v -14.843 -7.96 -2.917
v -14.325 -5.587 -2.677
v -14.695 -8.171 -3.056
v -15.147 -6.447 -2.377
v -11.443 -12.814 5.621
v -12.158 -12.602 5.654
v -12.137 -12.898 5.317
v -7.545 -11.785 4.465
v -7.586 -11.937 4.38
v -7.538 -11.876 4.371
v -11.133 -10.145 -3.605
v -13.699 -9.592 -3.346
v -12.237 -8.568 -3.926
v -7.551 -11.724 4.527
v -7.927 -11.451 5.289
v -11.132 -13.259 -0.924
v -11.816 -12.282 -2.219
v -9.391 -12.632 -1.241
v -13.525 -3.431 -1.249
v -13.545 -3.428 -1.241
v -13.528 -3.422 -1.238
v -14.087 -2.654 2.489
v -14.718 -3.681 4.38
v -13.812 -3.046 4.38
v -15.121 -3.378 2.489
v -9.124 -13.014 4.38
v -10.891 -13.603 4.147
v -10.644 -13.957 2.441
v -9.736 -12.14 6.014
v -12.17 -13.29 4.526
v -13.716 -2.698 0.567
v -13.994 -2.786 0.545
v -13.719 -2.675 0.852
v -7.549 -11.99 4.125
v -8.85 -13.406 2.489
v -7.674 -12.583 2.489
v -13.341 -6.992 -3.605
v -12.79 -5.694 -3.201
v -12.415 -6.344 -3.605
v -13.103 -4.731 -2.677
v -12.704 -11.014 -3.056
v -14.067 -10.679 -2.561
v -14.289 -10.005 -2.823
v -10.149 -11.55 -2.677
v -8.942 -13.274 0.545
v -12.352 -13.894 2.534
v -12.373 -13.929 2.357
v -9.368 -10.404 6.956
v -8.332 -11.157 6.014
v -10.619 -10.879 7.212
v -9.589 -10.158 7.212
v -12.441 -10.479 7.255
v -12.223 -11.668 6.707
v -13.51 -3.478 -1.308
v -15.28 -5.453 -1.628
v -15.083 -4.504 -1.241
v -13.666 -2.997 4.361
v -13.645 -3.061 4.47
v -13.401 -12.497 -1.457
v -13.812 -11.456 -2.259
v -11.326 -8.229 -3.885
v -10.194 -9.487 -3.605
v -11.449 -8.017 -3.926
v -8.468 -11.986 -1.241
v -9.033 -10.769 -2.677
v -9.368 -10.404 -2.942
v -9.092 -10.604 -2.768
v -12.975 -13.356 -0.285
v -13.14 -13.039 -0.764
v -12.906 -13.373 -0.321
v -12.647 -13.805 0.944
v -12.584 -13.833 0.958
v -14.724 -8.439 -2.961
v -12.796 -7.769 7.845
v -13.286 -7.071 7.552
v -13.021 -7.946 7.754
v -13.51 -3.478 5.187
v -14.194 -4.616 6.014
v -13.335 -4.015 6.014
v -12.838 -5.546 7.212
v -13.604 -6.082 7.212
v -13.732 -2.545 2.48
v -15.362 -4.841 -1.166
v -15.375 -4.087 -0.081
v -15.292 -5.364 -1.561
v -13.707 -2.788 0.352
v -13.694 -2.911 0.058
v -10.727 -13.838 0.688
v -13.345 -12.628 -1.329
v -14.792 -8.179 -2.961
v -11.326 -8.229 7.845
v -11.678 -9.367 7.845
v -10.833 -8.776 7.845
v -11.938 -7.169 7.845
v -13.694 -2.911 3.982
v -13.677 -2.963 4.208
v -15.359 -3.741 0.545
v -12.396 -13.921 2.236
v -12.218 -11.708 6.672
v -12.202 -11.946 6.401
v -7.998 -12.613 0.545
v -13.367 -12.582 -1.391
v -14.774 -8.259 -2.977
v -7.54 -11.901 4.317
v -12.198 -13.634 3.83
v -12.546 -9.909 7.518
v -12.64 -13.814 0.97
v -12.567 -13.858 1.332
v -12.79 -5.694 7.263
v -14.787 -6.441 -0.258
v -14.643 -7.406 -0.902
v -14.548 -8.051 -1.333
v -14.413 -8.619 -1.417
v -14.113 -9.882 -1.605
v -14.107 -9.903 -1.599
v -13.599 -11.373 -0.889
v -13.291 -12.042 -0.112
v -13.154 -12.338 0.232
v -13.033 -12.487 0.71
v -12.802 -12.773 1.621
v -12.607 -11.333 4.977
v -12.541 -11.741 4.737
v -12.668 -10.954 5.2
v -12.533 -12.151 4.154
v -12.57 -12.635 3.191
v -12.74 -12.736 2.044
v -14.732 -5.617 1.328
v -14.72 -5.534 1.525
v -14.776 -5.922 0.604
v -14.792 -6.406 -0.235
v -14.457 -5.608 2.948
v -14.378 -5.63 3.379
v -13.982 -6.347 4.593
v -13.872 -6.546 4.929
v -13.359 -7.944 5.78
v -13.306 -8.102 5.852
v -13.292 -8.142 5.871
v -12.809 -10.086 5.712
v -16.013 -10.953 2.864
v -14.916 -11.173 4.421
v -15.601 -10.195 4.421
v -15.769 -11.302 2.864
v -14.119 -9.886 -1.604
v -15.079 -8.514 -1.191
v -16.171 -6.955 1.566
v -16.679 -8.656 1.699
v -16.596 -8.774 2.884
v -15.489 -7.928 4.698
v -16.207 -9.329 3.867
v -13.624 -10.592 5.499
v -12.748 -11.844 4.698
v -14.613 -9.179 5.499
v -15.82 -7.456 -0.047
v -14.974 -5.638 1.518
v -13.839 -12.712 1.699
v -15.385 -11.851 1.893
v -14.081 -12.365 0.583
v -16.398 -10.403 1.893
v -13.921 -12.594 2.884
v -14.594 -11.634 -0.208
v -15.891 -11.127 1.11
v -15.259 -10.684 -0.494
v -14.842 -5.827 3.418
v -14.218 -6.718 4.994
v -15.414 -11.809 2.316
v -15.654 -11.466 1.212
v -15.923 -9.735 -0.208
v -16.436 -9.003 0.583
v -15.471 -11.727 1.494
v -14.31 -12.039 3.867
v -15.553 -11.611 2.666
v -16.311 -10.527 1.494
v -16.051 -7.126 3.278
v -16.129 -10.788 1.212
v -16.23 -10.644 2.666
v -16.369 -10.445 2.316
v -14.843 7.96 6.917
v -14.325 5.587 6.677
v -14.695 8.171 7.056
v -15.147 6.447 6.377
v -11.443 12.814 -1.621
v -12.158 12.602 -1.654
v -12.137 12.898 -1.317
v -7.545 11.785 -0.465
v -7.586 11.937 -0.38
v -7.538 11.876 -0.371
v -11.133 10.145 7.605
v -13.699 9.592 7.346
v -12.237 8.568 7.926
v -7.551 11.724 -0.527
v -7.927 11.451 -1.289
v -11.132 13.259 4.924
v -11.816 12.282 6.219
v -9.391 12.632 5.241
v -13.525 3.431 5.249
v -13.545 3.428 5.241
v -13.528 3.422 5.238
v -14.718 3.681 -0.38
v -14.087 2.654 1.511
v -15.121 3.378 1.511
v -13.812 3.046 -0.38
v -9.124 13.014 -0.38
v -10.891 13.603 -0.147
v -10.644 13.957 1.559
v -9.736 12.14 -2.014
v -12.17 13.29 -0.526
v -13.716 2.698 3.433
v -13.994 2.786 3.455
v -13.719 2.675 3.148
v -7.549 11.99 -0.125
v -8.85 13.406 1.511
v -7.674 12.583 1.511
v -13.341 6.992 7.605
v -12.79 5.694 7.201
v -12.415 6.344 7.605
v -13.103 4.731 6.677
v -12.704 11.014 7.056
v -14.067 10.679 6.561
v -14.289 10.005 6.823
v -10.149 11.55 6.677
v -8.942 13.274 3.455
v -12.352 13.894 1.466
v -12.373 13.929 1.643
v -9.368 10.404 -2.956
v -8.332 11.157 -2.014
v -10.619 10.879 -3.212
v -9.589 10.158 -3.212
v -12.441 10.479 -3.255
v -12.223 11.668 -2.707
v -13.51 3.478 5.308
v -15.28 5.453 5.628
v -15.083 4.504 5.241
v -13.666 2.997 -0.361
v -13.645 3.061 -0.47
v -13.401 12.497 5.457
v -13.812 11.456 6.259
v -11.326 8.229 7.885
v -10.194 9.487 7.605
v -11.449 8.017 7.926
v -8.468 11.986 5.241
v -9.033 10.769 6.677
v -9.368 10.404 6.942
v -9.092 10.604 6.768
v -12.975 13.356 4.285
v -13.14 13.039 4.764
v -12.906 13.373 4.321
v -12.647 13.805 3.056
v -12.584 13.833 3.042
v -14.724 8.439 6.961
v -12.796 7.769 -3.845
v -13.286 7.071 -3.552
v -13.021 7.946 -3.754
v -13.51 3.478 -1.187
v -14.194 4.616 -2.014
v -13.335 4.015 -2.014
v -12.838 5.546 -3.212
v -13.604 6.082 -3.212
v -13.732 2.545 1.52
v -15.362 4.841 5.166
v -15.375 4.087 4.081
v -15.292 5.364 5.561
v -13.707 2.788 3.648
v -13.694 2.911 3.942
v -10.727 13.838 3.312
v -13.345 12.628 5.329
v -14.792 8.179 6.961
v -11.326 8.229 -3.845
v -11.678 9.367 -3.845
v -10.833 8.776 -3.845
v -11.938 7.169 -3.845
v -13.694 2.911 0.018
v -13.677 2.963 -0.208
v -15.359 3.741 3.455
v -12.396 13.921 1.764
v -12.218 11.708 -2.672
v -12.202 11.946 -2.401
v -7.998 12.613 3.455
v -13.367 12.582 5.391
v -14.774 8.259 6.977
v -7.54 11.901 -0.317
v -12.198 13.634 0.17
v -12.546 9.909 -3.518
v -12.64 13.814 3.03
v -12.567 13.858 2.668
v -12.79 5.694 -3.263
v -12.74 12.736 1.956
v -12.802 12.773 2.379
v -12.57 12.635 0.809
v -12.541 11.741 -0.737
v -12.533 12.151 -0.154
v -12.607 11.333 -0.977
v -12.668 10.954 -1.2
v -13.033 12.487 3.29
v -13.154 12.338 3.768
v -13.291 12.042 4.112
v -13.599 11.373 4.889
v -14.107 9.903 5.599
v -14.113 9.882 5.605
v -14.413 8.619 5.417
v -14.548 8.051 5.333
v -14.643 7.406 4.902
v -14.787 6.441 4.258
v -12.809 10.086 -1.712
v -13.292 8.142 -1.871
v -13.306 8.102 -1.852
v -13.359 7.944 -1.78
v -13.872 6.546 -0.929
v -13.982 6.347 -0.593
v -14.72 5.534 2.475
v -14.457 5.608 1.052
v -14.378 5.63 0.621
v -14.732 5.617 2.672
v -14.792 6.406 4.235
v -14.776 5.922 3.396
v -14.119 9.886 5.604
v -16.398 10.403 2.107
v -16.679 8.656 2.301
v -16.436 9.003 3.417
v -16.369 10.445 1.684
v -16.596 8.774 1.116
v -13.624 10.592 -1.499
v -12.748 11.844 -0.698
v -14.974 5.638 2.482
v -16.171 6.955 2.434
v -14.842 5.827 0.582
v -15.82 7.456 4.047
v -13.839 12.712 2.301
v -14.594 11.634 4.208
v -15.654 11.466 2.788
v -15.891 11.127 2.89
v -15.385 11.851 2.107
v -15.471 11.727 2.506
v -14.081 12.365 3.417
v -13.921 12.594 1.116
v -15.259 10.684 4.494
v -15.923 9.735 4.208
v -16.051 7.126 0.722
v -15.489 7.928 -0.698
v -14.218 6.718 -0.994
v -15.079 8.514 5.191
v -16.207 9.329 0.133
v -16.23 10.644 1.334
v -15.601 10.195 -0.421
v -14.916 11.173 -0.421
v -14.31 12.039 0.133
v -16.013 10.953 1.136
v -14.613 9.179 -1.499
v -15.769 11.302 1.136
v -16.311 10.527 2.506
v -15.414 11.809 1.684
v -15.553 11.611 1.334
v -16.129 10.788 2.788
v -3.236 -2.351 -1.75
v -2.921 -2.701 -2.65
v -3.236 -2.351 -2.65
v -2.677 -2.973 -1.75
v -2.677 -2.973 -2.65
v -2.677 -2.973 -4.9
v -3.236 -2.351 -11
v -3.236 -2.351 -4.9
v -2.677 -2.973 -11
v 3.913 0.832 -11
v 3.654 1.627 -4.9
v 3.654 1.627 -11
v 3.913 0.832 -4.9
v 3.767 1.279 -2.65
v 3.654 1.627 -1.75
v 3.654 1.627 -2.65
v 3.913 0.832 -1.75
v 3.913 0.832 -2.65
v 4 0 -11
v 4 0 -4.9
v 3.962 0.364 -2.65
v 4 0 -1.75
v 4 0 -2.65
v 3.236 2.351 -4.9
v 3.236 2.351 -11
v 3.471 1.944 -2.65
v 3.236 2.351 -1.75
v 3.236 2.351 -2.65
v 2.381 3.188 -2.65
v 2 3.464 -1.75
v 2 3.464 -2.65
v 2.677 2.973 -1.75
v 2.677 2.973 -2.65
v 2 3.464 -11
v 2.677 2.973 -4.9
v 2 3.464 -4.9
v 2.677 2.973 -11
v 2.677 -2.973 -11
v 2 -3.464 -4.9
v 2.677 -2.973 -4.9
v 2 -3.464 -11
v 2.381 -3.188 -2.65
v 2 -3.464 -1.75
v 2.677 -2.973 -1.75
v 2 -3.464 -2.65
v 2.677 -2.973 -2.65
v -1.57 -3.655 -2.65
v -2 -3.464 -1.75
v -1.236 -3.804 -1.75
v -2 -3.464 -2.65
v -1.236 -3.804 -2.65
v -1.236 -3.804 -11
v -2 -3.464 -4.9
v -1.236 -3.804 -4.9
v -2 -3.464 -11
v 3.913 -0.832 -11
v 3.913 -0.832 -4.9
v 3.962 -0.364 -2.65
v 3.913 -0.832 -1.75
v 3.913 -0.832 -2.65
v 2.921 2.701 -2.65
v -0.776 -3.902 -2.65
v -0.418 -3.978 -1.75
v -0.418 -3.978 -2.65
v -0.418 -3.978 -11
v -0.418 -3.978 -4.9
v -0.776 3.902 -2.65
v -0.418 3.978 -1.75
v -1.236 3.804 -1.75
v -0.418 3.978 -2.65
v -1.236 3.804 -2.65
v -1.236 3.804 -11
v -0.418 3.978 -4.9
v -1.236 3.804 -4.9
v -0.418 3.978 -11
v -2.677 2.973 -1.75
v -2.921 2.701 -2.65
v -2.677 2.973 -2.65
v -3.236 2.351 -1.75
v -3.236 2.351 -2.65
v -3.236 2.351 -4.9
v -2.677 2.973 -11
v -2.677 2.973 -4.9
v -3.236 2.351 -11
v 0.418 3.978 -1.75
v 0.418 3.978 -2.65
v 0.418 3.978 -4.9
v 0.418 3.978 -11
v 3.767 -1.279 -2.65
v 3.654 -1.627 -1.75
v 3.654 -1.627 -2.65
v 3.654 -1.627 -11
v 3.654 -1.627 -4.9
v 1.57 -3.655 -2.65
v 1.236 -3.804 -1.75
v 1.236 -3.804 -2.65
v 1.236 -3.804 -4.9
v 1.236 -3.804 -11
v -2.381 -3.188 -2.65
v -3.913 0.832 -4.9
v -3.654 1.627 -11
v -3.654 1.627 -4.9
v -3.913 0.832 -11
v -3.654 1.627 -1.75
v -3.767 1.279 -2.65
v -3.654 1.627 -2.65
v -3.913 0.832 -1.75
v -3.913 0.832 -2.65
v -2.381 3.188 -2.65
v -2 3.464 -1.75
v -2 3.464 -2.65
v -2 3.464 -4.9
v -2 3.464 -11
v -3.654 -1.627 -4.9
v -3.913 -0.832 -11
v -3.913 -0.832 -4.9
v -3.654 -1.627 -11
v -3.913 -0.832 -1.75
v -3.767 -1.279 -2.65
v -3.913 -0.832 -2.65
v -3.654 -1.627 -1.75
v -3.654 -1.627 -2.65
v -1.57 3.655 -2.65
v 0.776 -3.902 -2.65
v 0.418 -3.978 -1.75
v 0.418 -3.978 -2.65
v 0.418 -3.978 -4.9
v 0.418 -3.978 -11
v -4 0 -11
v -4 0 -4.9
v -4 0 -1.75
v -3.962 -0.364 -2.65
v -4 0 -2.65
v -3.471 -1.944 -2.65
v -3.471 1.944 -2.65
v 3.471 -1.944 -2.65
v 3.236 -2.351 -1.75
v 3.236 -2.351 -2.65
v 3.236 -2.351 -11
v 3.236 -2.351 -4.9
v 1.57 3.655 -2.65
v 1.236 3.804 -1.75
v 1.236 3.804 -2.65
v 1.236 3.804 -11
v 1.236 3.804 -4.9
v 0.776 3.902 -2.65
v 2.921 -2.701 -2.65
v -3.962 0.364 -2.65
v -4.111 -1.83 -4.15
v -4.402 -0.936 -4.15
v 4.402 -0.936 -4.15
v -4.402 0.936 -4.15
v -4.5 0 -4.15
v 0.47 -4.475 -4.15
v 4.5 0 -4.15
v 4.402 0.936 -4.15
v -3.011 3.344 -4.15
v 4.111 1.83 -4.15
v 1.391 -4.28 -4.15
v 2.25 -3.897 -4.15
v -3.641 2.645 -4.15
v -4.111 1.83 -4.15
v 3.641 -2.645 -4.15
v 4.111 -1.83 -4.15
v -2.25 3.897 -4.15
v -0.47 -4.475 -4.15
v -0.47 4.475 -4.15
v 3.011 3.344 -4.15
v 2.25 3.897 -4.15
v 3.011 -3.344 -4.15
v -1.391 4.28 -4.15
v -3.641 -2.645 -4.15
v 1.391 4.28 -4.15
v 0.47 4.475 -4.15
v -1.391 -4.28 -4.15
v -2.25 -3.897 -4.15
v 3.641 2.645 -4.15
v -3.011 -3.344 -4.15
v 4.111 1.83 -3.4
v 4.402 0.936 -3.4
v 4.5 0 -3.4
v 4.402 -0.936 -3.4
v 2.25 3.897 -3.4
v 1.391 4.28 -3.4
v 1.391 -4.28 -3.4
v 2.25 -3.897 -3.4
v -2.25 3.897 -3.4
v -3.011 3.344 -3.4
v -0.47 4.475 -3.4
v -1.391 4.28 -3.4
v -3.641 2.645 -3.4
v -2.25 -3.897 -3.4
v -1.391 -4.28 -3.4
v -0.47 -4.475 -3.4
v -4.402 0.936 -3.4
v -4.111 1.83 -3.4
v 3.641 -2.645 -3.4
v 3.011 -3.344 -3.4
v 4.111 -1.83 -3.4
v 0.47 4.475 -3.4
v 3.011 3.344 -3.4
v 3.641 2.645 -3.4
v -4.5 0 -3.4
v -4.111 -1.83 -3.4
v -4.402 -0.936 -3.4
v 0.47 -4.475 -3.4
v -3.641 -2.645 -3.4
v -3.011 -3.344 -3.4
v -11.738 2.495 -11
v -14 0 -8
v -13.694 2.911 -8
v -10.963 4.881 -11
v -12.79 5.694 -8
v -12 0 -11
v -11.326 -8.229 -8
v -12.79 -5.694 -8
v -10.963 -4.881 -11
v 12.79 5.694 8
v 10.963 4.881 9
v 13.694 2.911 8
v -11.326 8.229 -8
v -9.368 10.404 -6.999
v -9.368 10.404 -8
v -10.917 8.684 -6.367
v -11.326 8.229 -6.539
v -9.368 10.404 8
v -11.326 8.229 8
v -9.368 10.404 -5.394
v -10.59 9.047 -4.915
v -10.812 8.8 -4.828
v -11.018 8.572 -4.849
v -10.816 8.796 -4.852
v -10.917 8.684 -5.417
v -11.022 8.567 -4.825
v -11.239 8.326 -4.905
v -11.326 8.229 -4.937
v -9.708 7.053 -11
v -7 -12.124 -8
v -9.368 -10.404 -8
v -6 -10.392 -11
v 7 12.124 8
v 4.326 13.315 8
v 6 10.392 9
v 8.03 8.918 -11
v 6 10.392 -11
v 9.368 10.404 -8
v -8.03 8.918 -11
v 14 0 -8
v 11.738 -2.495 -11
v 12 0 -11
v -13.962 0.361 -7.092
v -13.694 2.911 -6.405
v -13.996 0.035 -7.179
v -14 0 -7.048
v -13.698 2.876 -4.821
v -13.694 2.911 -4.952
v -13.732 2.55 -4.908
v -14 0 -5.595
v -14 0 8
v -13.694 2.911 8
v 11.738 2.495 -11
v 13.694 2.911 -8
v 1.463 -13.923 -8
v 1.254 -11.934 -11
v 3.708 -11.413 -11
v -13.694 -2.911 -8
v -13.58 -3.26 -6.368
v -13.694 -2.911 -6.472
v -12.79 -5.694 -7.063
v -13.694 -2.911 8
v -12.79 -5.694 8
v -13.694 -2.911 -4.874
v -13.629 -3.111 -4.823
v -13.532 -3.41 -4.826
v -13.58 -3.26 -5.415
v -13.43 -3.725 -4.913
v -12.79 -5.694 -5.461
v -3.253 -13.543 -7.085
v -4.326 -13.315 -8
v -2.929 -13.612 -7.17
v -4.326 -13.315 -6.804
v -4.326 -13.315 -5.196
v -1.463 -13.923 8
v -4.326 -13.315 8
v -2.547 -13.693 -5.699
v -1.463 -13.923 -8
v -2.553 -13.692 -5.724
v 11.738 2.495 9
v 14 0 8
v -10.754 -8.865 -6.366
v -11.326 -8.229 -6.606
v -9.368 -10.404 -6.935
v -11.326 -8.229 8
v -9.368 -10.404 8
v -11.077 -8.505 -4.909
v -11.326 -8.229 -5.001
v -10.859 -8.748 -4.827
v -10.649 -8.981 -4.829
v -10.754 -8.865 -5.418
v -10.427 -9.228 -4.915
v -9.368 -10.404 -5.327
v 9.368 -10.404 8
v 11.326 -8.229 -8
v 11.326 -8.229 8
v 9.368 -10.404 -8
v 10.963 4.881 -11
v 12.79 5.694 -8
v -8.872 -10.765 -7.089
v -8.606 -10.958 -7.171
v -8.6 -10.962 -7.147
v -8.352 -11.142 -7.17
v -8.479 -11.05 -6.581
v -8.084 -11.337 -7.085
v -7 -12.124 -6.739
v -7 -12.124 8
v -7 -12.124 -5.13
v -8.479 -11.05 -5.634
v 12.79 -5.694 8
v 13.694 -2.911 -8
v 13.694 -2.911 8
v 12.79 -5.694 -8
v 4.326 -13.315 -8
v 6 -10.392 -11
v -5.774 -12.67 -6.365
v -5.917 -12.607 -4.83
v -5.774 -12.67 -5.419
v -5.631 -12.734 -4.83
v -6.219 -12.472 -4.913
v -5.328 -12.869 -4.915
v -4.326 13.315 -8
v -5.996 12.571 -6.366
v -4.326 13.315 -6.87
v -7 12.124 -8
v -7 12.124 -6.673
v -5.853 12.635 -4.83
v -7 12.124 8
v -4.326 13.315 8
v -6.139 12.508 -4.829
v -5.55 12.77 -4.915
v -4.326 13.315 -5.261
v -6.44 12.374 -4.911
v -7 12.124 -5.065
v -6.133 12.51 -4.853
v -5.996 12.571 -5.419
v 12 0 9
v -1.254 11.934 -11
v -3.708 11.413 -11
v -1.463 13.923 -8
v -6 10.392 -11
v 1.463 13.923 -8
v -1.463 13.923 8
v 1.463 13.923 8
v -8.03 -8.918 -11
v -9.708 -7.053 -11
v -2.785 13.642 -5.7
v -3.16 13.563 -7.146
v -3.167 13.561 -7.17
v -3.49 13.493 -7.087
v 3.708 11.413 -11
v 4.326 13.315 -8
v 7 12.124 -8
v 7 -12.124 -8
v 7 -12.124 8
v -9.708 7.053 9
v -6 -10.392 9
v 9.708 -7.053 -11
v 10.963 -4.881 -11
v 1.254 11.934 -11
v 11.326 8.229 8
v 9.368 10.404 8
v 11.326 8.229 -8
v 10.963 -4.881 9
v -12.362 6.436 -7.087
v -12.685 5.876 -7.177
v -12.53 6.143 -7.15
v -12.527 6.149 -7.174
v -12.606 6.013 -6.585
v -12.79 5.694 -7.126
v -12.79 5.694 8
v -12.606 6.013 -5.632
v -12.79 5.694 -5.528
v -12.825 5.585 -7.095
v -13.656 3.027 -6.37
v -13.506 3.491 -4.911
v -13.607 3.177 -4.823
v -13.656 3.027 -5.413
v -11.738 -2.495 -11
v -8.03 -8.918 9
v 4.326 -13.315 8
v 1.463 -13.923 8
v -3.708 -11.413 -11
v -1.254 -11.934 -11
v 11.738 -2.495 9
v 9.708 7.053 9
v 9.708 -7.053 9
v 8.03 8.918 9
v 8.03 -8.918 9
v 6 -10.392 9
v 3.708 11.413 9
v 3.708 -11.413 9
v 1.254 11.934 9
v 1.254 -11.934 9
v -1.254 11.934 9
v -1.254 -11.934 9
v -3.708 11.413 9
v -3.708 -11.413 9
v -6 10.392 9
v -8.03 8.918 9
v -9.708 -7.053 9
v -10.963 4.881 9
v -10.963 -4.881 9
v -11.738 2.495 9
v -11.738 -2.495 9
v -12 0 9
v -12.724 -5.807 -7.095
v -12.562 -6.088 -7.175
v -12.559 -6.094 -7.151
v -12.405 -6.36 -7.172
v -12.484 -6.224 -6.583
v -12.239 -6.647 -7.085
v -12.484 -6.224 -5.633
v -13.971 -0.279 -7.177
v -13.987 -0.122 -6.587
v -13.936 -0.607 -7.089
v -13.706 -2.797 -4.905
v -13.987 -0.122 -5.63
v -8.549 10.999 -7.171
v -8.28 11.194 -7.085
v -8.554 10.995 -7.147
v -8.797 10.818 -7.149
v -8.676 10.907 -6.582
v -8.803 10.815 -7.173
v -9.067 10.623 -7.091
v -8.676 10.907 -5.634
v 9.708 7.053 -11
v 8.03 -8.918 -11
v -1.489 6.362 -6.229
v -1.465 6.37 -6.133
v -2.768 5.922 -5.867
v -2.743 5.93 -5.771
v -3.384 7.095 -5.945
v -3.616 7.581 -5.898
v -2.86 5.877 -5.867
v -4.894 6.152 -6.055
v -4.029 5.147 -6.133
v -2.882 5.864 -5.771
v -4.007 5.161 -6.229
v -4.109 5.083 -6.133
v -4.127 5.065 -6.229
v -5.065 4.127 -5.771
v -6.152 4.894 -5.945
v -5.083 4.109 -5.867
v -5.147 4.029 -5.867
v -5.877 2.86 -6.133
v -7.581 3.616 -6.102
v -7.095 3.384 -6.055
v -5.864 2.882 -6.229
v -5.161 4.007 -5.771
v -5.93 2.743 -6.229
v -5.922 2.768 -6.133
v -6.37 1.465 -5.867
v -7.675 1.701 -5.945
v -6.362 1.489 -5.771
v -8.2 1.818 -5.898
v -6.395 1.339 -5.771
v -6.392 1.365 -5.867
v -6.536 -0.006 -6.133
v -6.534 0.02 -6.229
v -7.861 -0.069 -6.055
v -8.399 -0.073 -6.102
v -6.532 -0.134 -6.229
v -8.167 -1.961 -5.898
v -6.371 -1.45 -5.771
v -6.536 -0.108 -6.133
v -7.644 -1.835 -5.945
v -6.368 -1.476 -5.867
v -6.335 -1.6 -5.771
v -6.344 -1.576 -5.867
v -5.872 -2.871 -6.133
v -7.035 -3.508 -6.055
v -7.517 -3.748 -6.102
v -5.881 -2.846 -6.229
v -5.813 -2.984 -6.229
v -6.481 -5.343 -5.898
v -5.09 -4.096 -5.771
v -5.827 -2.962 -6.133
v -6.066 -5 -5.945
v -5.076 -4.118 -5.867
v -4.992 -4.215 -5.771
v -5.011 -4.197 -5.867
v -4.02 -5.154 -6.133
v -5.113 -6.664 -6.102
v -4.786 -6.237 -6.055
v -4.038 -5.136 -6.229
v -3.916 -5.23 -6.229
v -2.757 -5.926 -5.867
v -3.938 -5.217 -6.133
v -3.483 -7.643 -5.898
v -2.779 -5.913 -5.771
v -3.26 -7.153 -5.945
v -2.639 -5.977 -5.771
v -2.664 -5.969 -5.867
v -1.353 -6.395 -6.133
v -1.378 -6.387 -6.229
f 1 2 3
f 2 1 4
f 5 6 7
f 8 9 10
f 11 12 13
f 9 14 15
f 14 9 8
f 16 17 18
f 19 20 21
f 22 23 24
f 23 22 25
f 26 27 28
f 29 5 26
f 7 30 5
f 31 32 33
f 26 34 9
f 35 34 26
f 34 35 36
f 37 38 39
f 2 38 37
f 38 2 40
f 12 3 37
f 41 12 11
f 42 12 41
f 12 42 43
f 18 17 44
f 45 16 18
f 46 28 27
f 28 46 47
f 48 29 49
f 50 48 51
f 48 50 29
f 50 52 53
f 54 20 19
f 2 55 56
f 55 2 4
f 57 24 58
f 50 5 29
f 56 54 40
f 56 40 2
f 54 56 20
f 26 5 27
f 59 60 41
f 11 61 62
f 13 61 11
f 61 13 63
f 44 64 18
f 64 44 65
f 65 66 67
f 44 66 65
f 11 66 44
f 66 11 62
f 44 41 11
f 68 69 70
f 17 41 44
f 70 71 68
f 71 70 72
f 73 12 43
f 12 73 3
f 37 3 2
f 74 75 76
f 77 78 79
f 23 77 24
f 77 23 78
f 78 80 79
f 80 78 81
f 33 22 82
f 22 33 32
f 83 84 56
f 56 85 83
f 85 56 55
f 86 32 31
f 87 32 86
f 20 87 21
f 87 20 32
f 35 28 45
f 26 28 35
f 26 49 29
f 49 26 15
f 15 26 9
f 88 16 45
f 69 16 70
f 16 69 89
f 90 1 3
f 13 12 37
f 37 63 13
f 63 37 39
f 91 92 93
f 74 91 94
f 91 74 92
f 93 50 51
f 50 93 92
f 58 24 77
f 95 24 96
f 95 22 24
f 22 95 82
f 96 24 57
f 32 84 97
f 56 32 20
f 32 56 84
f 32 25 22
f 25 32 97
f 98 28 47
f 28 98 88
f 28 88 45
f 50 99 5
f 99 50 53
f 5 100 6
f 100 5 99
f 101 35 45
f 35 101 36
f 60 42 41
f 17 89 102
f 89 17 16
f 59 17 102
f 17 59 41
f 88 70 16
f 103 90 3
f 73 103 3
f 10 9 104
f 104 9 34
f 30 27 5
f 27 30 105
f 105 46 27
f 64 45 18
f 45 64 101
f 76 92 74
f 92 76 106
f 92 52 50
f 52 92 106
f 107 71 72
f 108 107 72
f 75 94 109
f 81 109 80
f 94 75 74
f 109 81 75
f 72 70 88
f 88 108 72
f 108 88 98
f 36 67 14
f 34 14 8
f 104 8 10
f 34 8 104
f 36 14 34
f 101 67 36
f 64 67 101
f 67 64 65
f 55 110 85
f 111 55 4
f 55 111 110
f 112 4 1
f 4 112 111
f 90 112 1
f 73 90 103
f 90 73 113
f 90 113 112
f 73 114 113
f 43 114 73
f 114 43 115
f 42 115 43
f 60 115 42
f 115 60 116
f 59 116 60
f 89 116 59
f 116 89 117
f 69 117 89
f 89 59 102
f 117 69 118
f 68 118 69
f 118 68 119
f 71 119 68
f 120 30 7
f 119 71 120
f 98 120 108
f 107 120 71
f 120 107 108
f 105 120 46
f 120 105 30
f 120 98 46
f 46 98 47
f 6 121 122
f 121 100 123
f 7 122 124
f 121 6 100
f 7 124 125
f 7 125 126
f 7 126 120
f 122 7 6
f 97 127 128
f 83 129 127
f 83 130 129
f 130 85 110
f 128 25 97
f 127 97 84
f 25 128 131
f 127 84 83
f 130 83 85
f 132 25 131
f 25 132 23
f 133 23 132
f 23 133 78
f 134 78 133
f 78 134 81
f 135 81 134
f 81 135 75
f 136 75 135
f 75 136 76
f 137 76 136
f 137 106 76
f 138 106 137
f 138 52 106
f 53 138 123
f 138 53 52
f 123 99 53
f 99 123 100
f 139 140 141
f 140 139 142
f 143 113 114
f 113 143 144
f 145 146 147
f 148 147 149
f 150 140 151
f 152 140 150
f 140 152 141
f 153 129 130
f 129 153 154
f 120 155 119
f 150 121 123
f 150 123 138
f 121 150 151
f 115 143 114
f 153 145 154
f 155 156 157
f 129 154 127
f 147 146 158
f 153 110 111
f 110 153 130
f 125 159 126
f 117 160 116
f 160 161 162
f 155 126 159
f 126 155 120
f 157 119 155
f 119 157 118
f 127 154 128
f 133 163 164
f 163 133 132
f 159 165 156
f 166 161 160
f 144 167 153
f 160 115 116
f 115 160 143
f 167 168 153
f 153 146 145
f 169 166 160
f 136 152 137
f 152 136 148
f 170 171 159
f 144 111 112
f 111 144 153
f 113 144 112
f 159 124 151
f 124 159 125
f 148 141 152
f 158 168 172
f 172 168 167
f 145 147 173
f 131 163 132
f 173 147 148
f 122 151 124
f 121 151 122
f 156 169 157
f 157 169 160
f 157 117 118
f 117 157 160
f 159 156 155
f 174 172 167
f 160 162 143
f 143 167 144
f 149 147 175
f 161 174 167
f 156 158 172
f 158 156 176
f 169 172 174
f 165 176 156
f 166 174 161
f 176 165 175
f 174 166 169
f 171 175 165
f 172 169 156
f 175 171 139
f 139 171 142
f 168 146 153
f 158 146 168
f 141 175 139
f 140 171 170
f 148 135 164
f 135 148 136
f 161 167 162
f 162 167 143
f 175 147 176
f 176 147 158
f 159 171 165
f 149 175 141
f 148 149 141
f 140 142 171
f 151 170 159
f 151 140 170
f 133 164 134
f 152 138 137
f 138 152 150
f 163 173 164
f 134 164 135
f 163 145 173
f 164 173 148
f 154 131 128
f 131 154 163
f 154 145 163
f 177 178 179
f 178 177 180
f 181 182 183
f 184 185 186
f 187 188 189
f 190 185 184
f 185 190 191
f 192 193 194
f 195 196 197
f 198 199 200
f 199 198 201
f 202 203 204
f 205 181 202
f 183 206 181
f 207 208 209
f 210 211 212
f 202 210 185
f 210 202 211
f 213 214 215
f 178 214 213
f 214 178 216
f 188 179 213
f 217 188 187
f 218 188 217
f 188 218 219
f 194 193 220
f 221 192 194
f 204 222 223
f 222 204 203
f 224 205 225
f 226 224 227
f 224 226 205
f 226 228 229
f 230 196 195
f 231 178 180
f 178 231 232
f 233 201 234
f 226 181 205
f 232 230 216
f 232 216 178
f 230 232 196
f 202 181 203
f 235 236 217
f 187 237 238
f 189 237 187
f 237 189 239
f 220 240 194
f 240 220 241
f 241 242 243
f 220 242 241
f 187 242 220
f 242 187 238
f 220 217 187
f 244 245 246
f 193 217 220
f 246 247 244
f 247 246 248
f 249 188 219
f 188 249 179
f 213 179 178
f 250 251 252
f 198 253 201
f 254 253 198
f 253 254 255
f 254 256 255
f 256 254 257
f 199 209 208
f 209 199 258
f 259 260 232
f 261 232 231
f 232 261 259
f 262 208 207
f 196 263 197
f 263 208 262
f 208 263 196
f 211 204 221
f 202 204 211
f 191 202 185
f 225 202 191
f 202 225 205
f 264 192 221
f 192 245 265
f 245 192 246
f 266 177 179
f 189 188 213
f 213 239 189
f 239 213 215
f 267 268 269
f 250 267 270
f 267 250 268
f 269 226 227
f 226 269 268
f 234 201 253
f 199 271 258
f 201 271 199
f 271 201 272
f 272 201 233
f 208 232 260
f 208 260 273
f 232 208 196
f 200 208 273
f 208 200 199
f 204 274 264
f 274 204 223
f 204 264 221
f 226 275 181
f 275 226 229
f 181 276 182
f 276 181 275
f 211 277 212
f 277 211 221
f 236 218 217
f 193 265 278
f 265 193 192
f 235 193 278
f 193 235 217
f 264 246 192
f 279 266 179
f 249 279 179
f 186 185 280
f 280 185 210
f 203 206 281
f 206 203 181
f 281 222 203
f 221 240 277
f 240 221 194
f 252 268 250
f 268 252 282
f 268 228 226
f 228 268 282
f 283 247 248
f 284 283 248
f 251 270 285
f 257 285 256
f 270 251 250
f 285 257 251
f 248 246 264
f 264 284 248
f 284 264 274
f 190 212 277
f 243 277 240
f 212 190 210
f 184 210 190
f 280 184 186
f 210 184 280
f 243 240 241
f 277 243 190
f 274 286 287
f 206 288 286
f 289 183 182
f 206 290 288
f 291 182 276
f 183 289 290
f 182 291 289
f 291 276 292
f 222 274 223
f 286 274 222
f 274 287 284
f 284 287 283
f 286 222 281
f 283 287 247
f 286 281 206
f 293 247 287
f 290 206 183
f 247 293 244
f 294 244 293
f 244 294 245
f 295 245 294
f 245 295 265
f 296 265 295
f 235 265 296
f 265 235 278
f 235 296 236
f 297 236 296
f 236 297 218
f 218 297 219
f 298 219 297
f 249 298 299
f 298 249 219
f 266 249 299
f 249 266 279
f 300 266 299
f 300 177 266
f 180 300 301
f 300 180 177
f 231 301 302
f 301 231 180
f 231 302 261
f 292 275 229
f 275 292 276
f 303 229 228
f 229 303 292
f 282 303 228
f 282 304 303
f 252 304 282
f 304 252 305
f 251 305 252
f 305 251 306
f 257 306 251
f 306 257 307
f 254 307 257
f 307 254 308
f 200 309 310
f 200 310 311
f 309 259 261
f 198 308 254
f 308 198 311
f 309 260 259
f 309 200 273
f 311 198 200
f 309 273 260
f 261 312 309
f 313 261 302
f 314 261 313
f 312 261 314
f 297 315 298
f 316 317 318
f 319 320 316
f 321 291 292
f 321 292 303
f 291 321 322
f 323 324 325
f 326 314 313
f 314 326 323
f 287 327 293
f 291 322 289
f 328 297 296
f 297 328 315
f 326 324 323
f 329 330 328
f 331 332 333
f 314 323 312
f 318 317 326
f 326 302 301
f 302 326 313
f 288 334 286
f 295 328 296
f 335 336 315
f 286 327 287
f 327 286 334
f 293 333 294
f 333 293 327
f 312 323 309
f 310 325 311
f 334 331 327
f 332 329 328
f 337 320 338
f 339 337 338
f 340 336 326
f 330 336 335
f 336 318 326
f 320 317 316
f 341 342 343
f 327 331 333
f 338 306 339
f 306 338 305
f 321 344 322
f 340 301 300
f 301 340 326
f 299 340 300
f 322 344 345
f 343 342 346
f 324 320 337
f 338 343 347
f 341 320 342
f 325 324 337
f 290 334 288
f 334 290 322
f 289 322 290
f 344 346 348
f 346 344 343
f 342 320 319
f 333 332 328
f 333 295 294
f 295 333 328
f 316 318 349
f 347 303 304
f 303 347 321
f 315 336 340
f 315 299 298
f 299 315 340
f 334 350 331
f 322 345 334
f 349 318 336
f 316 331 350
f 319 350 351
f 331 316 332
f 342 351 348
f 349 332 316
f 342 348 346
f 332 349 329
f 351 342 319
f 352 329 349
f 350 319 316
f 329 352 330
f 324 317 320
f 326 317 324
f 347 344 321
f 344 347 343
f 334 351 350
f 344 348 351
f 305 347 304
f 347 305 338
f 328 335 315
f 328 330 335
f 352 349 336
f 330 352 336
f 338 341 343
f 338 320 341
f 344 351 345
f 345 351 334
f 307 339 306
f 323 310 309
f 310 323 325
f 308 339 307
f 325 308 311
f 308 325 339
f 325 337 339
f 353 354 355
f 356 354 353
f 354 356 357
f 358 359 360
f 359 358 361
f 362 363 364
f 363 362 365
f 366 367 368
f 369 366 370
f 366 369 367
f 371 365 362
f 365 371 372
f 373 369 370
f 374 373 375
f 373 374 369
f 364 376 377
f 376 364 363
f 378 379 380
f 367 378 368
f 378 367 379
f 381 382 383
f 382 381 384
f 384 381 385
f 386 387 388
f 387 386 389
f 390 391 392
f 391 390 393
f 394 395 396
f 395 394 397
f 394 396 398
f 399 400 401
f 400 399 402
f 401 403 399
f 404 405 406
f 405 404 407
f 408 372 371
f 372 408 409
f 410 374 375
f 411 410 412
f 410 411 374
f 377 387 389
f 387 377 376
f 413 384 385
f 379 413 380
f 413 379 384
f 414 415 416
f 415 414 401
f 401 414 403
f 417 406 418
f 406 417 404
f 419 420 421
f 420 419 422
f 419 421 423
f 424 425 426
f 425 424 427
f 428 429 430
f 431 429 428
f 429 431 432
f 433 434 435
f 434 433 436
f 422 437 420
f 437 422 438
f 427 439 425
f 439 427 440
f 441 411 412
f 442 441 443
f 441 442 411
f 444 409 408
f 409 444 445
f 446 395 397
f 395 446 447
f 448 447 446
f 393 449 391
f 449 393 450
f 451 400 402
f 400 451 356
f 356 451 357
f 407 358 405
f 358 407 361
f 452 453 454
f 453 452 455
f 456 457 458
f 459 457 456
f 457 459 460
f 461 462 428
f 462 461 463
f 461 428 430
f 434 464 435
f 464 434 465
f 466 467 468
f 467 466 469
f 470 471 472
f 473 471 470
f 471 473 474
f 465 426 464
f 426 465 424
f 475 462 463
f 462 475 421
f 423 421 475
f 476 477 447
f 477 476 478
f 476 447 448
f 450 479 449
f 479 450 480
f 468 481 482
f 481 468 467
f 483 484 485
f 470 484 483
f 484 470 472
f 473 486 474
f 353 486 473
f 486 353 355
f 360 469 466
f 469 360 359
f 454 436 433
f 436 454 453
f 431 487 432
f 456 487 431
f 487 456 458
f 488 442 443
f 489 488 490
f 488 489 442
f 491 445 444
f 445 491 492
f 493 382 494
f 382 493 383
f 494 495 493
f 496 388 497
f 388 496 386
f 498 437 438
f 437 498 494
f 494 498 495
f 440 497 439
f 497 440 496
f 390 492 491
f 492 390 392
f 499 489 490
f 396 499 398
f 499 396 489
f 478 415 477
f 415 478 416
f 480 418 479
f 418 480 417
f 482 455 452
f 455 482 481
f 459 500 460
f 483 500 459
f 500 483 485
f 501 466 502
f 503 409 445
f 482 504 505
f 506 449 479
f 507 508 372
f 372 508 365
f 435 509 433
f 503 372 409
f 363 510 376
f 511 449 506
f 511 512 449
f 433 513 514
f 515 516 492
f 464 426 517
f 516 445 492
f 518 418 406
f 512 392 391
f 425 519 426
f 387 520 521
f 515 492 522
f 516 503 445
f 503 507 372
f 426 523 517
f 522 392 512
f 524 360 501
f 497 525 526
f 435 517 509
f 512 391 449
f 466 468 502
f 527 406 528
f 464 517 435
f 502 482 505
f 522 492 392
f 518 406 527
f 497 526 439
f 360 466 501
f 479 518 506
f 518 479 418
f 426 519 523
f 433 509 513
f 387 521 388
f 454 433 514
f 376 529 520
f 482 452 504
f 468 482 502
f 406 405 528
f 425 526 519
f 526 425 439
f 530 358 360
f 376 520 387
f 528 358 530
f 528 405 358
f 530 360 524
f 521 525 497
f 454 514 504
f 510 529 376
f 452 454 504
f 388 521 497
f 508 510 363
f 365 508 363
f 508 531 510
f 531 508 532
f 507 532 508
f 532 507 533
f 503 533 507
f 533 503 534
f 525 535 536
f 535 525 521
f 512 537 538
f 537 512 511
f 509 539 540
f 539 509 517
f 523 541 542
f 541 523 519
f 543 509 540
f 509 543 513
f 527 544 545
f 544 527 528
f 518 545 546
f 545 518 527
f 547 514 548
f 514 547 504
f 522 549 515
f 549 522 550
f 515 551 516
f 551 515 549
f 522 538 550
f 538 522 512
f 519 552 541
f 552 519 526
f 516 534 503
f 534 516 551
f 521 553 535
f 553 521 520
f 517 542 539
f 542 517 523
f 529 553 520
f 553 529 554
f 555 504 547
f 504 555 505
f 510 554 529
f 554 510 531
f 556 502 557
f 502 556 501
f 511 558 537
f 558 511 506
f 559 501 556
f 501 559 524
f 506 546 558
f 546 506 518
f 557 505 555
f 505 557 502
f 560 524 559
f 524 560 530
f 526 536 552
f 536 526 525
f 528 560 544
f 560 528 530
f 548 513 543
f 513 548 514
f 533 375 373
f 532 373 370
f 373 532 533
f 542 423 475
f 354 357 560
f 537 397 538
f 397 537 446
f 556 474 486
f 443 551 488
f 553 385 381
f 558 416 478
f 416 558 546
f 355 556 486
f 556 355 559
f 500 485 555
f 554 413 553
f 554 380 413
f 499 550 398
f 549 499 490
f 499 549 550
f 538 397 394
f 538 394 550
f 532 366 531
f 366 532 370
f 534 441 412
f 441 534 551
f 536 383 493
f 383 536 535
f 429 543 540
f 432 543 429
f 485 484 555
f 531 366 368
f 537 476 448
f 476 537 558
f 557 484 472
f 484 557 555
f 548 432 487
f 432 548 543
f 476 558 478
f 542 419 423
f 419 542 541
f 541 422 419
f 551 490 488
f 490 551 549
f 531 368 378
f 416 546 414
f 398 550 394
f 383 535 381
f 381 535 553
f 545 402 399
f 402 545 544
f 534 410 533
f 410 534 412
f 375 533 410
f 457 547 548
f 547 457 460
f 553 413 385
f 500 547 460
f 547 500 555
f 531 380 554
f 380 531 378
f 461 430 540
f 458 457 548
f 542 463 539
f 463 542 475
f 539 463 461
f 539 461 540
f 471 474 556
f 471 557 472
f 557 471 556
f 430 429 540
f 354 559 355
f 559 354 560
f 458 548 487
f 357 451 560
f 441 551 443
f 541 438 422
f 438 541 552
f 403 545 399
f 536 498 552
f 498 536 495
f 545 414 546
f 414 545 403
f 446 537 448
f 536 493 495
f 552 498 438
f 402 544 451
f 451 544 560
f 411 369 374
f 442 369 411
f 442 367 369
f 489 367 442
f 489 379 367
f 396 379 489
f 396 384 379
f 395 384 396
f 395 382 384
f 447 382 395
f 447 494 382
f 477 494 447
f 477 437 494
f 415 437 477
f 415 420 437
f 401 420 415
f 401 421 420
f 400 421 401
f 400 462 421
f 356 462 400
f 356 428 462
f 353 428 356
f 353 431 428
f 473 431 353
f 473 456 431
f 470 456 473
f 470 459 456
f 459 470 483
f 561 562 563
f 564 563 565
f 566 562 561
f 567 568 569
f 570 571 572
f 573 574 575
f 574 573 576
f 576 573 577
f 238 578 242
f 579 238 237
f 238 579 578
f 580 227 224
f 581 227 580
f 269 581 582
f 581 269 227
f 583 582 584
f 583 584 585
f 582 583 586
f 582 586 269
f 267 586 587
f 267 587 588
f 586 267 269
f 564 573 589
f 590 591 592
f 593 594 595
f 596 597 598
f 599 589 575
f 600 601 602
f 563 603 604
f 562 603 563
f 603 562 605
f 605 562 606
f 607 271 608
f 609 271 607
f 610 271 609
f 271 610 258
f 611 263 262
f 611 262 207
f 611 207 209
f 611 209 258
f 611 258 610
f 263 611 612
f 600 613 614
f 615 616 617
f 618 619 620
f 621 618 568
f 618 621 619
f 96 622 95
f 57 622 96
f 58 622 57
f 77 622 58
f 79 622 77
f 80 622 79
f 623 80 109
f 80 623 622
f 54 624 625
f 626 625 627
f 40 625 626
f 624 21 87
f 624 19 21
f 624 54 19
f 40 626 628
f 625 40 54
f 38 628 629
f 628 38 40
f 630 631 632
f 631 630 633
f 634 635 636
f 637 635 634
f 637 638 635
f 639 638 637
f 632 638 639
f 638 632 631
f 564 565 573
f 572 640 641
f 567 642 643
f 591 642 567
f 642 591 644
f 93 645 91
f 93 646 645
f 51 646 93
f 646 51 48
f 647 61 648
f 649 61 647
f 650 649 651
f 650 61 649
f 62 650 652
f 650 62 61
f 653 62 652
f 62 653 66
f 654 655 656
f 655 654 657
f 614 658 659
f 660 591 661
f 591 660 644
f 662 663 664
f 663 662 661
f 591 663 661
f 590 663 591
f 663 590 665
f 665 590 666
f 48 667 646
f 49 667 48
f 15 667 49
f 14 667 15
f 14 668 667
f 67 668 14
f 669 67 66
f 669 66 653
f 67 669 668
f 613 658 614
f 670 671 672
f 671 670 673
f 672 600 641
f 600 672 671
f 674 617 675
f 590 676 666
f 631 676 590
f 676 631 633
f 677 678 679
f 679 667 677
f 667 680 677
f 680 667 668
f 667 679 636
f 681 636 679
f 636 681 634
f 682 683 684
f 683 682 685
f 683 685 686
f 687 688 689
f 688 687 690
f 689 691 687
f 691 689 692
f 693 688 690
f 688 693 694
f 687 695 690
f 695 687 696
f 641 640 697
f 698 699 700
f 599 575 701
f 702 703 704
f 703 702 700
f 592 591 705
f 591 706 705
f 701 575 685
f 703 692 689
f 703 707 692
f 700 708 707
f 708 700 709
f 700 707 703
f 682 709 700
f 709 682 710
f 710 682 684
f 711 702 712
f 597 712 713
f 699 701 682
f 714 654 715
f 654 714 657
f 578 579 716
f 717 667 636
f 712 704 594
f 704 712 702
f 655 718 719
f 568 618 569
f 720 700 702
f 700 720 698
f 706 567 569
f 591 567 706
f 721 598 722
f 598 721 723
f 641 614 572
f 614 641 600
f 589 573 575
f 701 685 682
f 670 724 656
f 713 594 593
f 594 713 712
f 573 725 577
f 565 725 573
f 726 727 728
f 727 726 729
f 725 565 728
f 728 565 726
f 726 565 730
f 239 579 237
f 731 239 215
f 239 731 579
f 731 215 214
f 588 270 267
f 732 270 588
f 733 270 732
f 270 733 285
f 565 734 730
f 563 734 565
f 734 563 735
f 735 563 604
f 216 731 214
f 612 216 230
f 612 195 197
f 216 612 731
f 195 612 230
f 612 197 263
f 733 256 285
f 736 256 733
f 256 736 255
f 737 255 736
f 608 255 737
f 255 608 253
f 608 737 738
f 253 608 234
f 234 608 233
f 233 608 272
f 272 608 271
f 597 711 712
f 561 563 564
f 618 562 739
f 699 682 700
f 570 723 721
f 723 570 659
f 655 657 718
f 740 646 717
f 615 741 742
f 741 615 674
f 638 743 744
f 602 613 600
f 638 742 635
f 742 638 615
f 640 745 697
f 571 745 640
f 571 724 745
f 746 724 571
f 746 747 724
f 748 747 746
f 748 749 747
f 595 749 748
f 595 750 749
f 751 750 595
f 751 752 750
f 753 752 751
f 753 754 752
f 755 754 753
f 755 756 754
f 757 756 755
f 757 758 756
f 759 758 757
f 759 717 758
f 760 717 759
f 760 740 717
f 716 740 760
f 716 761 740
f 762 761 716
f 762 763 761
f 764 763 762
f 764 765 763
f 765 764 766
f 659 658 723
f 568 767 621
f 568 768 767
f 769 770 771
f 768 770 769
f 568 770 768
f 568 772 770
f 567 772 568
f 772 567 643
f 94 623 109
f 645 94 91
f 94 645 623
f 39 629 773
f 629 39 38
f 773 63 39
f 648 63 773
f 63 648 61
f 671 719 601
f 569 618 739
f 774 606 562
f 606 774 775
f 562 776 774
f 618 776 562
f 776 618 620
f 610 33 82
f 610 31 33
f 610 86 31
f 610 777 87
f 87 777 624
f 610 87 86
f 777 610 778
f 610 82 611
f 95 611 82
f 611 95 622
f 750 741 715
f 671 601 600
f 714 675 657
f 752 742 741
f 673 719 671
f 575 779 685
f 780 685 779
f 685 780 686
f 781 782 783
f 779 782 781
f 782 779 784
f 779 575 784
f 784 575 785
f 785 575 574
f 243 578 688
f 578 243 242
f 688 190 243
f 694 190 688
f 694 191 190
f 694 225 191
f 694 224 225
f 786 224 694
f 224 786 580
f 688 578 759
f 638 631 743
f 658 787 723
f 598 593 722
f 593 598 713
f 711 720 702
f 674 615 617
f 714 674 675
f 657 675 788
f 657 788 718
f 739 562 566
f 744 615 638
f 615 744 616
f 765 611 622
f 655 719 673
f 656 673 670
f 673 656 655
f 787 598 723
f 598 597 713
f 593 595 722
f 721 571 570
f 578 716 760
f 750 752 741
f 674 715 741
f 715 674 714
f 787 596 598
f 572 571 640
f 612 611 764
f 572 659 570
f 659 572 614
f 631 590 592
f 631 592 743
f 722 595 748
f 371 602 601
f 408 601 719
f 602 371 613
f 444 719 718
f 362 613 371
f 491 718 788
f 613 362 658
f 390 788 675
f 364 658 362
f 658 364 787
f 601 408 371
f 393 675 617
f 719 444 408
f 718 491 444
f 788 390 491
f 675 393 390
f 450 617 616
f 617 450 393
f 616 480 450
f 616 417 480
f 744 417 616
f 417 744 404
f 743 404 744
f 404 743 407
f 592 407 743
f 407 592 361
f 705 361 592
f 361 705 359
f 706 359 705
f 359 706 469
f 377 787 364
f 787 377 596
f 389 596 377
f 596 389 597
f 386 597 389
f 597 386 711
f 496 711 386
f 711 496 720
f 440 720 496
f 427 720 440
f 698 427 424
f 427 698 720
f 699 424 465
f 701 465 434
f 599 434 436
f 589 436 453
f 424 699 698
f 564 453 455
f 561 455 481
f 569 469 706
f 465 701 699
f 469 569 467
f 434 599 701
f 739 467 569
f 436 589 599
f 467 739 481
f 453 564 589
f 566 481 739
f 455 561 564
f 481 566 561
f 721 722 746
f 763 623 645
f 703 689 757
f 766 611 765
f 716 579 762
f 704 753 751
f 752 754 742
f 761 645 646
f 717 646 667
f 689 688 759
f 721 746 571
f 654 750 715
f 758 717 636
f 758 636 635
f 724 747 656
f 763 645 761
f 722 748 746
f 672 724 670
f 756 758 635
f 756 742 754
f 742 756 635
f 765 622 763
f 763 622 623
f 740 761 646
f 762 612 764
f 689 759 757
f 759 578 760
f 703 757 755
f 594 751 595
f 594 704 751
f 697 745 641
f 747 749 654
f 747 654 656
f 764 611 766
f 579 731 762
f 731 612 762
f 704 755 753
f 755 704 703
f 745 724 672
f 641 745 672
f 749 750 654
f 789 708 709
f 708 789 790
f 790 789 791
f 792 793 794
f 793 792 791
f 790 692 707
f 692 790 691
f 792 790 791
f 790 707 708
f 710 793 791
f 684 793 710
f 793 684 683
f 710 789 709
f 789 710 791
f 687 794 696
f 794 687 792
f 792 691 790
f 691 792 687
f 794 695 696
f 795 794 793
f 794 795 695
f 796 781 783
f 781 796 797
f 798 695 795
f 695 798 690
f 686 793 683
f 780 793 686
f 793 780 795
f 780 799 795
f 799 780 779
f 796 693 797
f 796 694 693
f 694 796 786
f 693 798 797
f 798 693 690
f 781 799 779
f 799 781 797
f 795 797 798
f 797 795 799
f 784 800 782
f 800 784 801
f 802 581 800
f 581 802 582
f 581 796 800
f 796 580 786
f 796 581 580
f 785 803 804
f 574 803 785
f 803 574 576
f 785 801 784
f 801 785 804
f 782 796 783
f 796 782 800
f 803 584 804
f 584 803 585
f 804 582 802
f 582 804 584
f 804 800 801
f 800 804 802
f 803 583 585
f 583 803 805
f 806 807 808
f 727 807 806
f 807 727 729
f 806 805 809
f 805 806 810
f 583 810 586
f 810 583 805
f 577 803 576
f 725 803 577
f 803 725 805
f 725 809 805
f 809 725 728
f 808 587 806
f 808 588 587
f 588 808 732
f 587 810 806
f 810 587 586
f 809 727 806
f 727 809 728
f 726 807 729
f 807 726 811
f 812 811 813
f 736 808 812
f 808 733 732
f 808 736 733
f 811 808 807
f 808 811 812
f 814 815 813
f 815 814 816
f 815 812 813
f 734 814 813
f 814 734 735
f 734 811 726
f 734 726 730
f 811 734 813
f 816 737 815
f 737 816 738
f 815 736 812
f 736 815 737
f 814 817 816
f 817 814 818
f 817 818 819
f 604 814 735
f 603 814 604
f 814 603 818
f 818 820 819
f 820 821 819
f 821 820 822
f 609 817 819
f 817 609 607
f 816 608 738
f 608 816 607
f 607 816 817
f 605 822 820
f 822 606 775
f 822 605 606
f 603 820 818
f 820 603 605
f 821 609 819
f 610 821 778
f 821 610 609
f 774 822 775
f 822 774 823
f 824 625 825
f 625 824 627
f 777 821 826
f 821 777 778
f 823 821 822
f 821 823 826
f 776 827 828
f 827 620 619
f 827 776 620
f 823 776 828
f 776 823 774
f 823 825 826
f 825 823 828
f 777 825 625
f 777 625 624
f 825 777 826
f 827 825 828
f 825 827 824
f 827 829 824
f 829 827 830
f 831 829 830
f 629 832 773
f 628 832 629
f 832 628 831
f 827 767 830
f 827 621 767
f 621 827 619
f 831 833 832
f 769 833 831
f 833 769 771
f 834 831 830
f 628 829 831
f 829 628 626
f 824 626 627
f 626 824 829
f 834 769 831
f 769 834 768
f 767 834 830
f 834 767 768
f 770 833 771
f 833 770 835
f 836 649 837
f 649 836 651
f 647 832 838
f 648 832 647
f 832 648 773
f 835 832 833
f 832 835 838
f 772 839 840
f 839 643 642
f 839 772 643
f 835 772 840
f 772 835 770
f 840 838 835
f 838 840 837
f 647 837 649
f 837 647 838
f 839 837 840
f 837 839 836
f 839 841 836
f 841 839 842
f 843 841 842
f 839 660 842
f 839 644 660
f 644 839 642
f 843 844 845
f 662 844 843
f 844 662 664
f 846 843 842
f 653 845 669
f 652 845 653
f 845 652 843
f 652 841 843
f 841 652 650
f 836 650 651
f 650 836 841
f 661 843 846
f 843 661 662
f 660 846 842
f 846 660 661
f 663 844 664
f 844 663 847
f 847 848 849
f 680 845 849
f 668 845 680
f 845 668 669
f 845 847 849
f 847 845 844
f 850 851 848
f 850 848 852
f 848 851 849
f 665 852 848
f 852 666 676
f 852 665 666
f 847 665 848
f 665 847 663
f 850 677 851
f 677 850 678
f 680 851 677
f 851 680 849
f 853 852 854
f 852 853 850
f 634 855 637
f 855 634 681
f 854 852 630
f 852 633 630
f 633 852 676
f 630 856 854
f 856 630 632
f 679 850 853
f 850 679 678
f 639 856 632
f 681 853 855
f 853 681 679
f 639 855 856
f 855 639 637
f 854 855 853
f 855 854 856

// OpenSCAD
// file: pin_joints.scad
include <pins.scad>

// default is 0.3
tolerance = 0.3;

// pinpeg(h=40);
// pin();
// pin(side=true);
// pinhole(t=tolerance);
// pintack(h=10, r=4);
//pins();

// wheel();
// translate([-25/2, 0, 0]) axel_tight();
// translate([-25/2, 0, 0]) axel_loose();
// translate([-25/2, 0, 0]) axel_loose_and_tight();
//plate();
//plate_simple();

module pins() {
  translate([-21, 0, 0]) pinpeg(h=20);
  translate([0, 0, 0]) pintack(h=11);
  translate([21, 0, 0]) pintack(h=11);
}

module wheel() {
  difference() {
    union() {
      translate([0, 0, 10]) cylinder(h=5, r1=20/2, r2=17/2);
      translate([0, 0, 5]) cylinder(h=5, r=20/2);
      translate([0, 0, 0]) cylinder(h=5, r1=17/2, r2=20/2);
    }

    translate([0, 0, 11]) cylinder(h=15, r=13/2);    
    pinhole(h=5, t=tolerance);
  }  
}

module axel_tight() {
  difference() {
    union() {
      translate([0, -2.5, 0]) cube([25, 5, 5]);
      cylinder(h=5, r=5*1.75);
      translate([25, 0, 0]) cylinder(h=12, r=5*1.75);
    }
  
    pinhole(h=5, t=tolerance);
    translate([25, 0, 10+2]) rotate([180, 0, 0]) pinhole(h=8, t=tolerance);
  }
}

module axel_loose() {
  difference() {
    union() {
      translate([0, -2.5, 0]) cube([25, 5, 5]);
      cylinder(h=5, r=5*1.75);
      translate([25, 0, 0]) cylinder(h=5, r=5*1.75);
    }
  
    translate([0, 0, 5]) rotate([180, 0, 0]) pinhole(h=5, t=tolerance, tight=false);
    translate([25, 0, 0]) pinhole(h=5, t=tolerance, tight=false);
  }
}

module axel_loose_and_tight() {
  difference() {
    union() {
      translate([0, -2.5, 0]) cube([25, 5, 5]);
      cylinder(h=5, r=5*1.75);
      translate([25, 0, 0]) cylinder(h=5, r=5*1.75);
    }
  
    pinhole(h=10, t=tolerance);
    translate([25, 0, 0]) pinhole(h=10, t=tolerance, tight=false);
  }
}

module plate() {
  %translate([0, 0, -0.5]) cube([100, 100, 1], center=true);
  
  translate([0, 21, 0]) pins();

  translate([-21, 0, 0]) wheel();

  translate([-21, -21, 0]) wheel();

  translate([0, 0, 0]) axel_tight();

  translate([0, -20, 0]) axel_loose();
}

module plate_simple() {
  %translate([0, 0, -0.5]) cube([100, 100, 1], center=true);
  
 translate([-10.5, 10.5, 0]) pintack(h=11);
 translate([10.5, 10.5, 0]) pintack(h=11);
 translate([-25/2, -10.5, 0]) axel_loose_and_tight();
  
}
// file: pins.scad
// Pin Connectors V3
// Tony Buser <tbuser@gmail.com>
// Modified by Emmett Lalish

//pinhole(tight=true,fixed=false);
//pin_vertical();

// test();
// pintack(h=10);
// pinpeg(h=20);


module test() {
  tolerance = 0.3;
  
  translate([-12, 12, 0]) pinpeg(h=20);
  translate([12, 12, 0]) pintack(h=10);
  
  difference() {
    union() {
      translate([0, -12, 2.5]) cube(size = [59, 20, 5], center = true);
      translate([24, -12, 7.5]) cube(size = [12, 20, 15], center = true);
    }
    translate([-24, -12, 0]) pinhole(h=5, t=tolerance);
    translate([-12, -12, 0]) pinhole(h=5, t=tolerance, tight=false);
    translate([0, -12, 0]) pinhole(h=10, t=tolerance);
    translate([12, -12, 0]) pinhole(h=10, t=tolerance, tight=false);
    translate([24, -12, 15]) rotate([0, 180, 0]) pinhole(h=10, t=tolerance);
  }
}

module pinhole(h=10, r=4, lh=3, lt=1, t=0.3, tight=true, fixed=false) {
  // h = shaft height
  // r = shaft radius
  // lh = lip height
  // lt = lip thickness
  // t = extra tolerance for loose fit
  // tight = set to false if you want a joint that spins easily
  // fixed = set to true so pins can't spin
  
intersection(){
  union() {
	if (tight == true || fixed == true) {
      pin_solid(h, r, lh, lt);
	  translate([0,0,-t/2])cylinder(h=h+t, r=r, $fn=30);
	} else {
	  pin_solid(h, r+t/2, lh, lt);
	  translate([0,0,-t/2])cylinder(h=h+t, r=r+t/2, $fn=30);
	}
    
    
    // widen the entrance hole to make insertion easier
    //translate([0, 0, -0.1]) cylinder(h=lh/3, r2=r, r1=r+(t/2)+(lt/2),$fn=30);
  }
  if (fixed == true) {
	translate([-r*2, -r*0.75, -1])cube([r*4, r*1.5, h+2]);
  }
}}

module pin(h=10, r=4, lh=3, lt=1, t=0.2, side=false) {
  // h = shaft height
  // r = shaft radius
  // lh = lip height
  // lt = lip thickness
  // side = set to true if you want it printed horizontally

  if (side) {
    pin_horizontal(h, r, lh, lt, t);
  } else {
    pin_vertical(h, r, lh, lt, t);
  }
}

module pintack(h=10, r=4, lh=3, lt=1, t=0.2, bh=3, br=8.75) {
  // bh = base_height
  // br = base_radius
  
  union() {
    cylinder(h=bh, r=br);
    translate([0, 0, bh]) pin(h, r, lh, lt, t);
  }
}

module pinpeg(h=20, r=4, lh=3, lt=1, t=0.2) {
  union() {
    translate([0,-0.05, 0]) pin(h/2+0.1, r, lh, lt, t, side=true);
    translate([0,0.05, 0]) rotate([0, 0, 180]) pin(h/2+0.1, r, lh, lt, t, side=true);
  }
}

// just call pin instead, I made this module because it was easier to do the rotation option this way
// since openscad complains of recursion if I did it all in one module
module pin_vertical(h=10, r=4, lh=3, lt=1, t=0.2) {
  // h = shaft height
  // r = shaft radius
  // lh = lip height
  // lt = lip thickness

  difference() {
    pin_solid(h, r-t/2, lh, lt);
    
    // center cut
    translate([-lt*3/2, -(r*2+lt*2)/2, h/5+lt*3/2]) cube([lt*3, r*2+lt*2, h]);
    //translate([0, 0, h/4]) cylinder(h=h+lh, r=r/2.5, $fn=20);
    // center curve
    translate([0, 0, h/5+lt*3/2]) rotate([90, 0, 0]) cylinder(h=r*2, r=lt*3/2, center=true, $fn=20);
  
    // side cuts
    translate([-r*2, -r-r*0.75+t/2, -1]) cube([r*4, r, h+2]);
    translate([-r*2, r*0.75-t/2, -1]) cube([r*4, r, h+2]);
  }
}

// call pin with side=true instead of this
module pin_horizontal(h=10, r=4, lh=3, lt=1, t=0.2) {
  // h = shaft height
  // r = shaft radius
  // lh = lip height
  // lt = lip thickness
  translate([0, 0, r*0.75-t/2]) rotate([-90, 0, 0]) pin_vertical(h, r, lh, lt, t);
}

// this is mainly to make the pinhole module easier
module pin_solid(h=10, r=4, lh=3, lt=1) {
  union() {
    // shaft
    cylinder(h=h-lh, r=r, $fn=30);
    // lip
    // translate([0, 0, h-lh]) cylinder(h=lh*0.25, r1=r, r2=r+(lt/2), $fn=30);
    // translate([0, 0, h-lh+lh*0.25]) cylinder(h=lh*0.25, r2=r, r1=r+(lt/2), $fn=30);
    // translate([0, 0, h-lh+lh*0.50]) cylinder(h=lh*0.50, r1=r, r2=r-(lt/2), $fn=30);

    // translate([0, 0, h-lh]) cylinder(h=lh*0.50, r1=r, r2=r+(lt/2), $fn=30);
    // translate([0, 0, h-lh+lh*0.50]) cylinder(h=lh*0.50, r1=r+(lt/2), r2=r-(lt/3), $fn=30);    

    translate([0, 0, h-lh]) cylinder(h=lh*0.25, r1=r, r2=r+(lt/2), $fn=30);
    translate([0, 0, h-lh+lh*0.25]) cylinder(h=lh*0.25, r=r+(lt/2), $fn=30);    
    translate([0, 0, h-lh+lh*0.50]) cylinder(h=lh*0.50, r1=r+(lt/2), r2=r-(lt/2), $fn=30);    

    // translate([0, 0, h-lh]) cylinder(h=lh, r1=r+(lt/2), r2=1, $fn=30);
    // translate([0, 0, h-lh-lt/2]) cylinder(h=lt/2, r1=r, r2=r+(lt/2), $fn=30);
  }
}

module pinshaft(h=10, r=4, t=0.2, side=false){
flip=side ? 1 : 0;
translate(flip*[0,h/2,r*0.75-t/2])rotate(flip*[90,0,0])
intersection(){
	cylinder(h=h, r=r-t/2, $fn=30);
	translate([-r*2, -r*0.75+t/2, -1])cube([r*4, r*1.5-t, h+2]);
}
}
// main file
include <pins.scad>
include <pin_joints.scad>

head_r = 14;
head_h = 20;
bevel_h = 2;
eyeAngle = 35;

module eyeconnector(){
	pin(h=8, r=2.5, lh=3, lt=0.5, t=0.2, side=true);
	translate([0,1.5,0])rotate([0,0,180])pin(h=8, r=2.5, lh=3, lt=0.5, t=0.2, side=true);
}


module springy(){
	union(){
		pin(h=8, r=2.5, lh=3, lt=0.5, t=0.2, side=true);
		translate([0,-21.5,0])rotate([0,0,180])pin(h=8, r=2.5, lh=3, lt=0.5, t=0.2, side=true);
		difference(){
			translate([-2.5,-21.5,0.05])	cube([5,21.5,3.5]);
			translate([1,-3,0])scube();
			translate([-1,-7,0])scube();
			translate([1,-11,0])scube();
			translate([-1,-15,0])scube();
			translate([1,-19,0])scube();
		}
	}
}

module scube(){
	cube([5,2.5,10],center=true);
}

//translate([0,0,26])rotate([90,0,0])springy();
asm();
//translate([0,0,10])bauble();

module bauble(){
	br=6;
	difference(){
		translate([0,0,br])sphere(r=br);
		pinhole(h=8, r=2.5, lh=3, lt=0.5, t=0.2);
	}
}

module inplaceeye(rot=0){
	translate([-1 * head_r,0,2])rotate([0,90,0]){
		eye(rot);
	}

}

module eye(rot = 0){
	eye_r = 6;
	rotate([rot,rot,0]){
		intersection(){
			sphere(r=6);
			rotate([20,10,0])cube([2 * eye_r,2 * eye_r,0.8 * eye_r], center=true);
		}
		translate([0,0,-1.5])sphere(r=4);
	}
}


module asm(){

	difference(){
		head();
		rotate([0,0,6])translate([0,0,-6])smile();
	}
}

module head(){
	rotate([0,0,eyeAngle])inplaceeye();
	rotate([0,0,-1 * eyeAngle])inplaceeye(180);
	difference(){
		hull(){
			cylinder(r=head_r, h=head_h - 2* bevel_h, center=true);
			translate([0,0,-1])cylinder(r=head_r-bevel_h, h=head_h, center=true);
		}
		translate([0,0,-1 * head_h/2 -0.9])pinhole(h=9,t=tolerance);
		//translate([0,0,head_h/2 - 1])rotate([180,0,0])pinhole(h=8, r=2.5, lh=3, lt=0.5, t=0.2);
	}
}

module tooth(a){
	tooth_w = 4;
	rotate([0,a,0]){
		hull(){
			translate([0,head_r * 0.5,0])cube([tooth_w * 0.35,1,0.1], center=true);
			translate([0,head_r * 1.2,0])cube([tooth_w,1,2], center=true);
		}
	}
}

module smile(){
	teeth = 6;
	for(t=[1:1:teeth]){
		rotate([0,0,26 * t - 13])tooth(15);
		rotate([0,0,26 * t])tooth(-15);
	}
}
